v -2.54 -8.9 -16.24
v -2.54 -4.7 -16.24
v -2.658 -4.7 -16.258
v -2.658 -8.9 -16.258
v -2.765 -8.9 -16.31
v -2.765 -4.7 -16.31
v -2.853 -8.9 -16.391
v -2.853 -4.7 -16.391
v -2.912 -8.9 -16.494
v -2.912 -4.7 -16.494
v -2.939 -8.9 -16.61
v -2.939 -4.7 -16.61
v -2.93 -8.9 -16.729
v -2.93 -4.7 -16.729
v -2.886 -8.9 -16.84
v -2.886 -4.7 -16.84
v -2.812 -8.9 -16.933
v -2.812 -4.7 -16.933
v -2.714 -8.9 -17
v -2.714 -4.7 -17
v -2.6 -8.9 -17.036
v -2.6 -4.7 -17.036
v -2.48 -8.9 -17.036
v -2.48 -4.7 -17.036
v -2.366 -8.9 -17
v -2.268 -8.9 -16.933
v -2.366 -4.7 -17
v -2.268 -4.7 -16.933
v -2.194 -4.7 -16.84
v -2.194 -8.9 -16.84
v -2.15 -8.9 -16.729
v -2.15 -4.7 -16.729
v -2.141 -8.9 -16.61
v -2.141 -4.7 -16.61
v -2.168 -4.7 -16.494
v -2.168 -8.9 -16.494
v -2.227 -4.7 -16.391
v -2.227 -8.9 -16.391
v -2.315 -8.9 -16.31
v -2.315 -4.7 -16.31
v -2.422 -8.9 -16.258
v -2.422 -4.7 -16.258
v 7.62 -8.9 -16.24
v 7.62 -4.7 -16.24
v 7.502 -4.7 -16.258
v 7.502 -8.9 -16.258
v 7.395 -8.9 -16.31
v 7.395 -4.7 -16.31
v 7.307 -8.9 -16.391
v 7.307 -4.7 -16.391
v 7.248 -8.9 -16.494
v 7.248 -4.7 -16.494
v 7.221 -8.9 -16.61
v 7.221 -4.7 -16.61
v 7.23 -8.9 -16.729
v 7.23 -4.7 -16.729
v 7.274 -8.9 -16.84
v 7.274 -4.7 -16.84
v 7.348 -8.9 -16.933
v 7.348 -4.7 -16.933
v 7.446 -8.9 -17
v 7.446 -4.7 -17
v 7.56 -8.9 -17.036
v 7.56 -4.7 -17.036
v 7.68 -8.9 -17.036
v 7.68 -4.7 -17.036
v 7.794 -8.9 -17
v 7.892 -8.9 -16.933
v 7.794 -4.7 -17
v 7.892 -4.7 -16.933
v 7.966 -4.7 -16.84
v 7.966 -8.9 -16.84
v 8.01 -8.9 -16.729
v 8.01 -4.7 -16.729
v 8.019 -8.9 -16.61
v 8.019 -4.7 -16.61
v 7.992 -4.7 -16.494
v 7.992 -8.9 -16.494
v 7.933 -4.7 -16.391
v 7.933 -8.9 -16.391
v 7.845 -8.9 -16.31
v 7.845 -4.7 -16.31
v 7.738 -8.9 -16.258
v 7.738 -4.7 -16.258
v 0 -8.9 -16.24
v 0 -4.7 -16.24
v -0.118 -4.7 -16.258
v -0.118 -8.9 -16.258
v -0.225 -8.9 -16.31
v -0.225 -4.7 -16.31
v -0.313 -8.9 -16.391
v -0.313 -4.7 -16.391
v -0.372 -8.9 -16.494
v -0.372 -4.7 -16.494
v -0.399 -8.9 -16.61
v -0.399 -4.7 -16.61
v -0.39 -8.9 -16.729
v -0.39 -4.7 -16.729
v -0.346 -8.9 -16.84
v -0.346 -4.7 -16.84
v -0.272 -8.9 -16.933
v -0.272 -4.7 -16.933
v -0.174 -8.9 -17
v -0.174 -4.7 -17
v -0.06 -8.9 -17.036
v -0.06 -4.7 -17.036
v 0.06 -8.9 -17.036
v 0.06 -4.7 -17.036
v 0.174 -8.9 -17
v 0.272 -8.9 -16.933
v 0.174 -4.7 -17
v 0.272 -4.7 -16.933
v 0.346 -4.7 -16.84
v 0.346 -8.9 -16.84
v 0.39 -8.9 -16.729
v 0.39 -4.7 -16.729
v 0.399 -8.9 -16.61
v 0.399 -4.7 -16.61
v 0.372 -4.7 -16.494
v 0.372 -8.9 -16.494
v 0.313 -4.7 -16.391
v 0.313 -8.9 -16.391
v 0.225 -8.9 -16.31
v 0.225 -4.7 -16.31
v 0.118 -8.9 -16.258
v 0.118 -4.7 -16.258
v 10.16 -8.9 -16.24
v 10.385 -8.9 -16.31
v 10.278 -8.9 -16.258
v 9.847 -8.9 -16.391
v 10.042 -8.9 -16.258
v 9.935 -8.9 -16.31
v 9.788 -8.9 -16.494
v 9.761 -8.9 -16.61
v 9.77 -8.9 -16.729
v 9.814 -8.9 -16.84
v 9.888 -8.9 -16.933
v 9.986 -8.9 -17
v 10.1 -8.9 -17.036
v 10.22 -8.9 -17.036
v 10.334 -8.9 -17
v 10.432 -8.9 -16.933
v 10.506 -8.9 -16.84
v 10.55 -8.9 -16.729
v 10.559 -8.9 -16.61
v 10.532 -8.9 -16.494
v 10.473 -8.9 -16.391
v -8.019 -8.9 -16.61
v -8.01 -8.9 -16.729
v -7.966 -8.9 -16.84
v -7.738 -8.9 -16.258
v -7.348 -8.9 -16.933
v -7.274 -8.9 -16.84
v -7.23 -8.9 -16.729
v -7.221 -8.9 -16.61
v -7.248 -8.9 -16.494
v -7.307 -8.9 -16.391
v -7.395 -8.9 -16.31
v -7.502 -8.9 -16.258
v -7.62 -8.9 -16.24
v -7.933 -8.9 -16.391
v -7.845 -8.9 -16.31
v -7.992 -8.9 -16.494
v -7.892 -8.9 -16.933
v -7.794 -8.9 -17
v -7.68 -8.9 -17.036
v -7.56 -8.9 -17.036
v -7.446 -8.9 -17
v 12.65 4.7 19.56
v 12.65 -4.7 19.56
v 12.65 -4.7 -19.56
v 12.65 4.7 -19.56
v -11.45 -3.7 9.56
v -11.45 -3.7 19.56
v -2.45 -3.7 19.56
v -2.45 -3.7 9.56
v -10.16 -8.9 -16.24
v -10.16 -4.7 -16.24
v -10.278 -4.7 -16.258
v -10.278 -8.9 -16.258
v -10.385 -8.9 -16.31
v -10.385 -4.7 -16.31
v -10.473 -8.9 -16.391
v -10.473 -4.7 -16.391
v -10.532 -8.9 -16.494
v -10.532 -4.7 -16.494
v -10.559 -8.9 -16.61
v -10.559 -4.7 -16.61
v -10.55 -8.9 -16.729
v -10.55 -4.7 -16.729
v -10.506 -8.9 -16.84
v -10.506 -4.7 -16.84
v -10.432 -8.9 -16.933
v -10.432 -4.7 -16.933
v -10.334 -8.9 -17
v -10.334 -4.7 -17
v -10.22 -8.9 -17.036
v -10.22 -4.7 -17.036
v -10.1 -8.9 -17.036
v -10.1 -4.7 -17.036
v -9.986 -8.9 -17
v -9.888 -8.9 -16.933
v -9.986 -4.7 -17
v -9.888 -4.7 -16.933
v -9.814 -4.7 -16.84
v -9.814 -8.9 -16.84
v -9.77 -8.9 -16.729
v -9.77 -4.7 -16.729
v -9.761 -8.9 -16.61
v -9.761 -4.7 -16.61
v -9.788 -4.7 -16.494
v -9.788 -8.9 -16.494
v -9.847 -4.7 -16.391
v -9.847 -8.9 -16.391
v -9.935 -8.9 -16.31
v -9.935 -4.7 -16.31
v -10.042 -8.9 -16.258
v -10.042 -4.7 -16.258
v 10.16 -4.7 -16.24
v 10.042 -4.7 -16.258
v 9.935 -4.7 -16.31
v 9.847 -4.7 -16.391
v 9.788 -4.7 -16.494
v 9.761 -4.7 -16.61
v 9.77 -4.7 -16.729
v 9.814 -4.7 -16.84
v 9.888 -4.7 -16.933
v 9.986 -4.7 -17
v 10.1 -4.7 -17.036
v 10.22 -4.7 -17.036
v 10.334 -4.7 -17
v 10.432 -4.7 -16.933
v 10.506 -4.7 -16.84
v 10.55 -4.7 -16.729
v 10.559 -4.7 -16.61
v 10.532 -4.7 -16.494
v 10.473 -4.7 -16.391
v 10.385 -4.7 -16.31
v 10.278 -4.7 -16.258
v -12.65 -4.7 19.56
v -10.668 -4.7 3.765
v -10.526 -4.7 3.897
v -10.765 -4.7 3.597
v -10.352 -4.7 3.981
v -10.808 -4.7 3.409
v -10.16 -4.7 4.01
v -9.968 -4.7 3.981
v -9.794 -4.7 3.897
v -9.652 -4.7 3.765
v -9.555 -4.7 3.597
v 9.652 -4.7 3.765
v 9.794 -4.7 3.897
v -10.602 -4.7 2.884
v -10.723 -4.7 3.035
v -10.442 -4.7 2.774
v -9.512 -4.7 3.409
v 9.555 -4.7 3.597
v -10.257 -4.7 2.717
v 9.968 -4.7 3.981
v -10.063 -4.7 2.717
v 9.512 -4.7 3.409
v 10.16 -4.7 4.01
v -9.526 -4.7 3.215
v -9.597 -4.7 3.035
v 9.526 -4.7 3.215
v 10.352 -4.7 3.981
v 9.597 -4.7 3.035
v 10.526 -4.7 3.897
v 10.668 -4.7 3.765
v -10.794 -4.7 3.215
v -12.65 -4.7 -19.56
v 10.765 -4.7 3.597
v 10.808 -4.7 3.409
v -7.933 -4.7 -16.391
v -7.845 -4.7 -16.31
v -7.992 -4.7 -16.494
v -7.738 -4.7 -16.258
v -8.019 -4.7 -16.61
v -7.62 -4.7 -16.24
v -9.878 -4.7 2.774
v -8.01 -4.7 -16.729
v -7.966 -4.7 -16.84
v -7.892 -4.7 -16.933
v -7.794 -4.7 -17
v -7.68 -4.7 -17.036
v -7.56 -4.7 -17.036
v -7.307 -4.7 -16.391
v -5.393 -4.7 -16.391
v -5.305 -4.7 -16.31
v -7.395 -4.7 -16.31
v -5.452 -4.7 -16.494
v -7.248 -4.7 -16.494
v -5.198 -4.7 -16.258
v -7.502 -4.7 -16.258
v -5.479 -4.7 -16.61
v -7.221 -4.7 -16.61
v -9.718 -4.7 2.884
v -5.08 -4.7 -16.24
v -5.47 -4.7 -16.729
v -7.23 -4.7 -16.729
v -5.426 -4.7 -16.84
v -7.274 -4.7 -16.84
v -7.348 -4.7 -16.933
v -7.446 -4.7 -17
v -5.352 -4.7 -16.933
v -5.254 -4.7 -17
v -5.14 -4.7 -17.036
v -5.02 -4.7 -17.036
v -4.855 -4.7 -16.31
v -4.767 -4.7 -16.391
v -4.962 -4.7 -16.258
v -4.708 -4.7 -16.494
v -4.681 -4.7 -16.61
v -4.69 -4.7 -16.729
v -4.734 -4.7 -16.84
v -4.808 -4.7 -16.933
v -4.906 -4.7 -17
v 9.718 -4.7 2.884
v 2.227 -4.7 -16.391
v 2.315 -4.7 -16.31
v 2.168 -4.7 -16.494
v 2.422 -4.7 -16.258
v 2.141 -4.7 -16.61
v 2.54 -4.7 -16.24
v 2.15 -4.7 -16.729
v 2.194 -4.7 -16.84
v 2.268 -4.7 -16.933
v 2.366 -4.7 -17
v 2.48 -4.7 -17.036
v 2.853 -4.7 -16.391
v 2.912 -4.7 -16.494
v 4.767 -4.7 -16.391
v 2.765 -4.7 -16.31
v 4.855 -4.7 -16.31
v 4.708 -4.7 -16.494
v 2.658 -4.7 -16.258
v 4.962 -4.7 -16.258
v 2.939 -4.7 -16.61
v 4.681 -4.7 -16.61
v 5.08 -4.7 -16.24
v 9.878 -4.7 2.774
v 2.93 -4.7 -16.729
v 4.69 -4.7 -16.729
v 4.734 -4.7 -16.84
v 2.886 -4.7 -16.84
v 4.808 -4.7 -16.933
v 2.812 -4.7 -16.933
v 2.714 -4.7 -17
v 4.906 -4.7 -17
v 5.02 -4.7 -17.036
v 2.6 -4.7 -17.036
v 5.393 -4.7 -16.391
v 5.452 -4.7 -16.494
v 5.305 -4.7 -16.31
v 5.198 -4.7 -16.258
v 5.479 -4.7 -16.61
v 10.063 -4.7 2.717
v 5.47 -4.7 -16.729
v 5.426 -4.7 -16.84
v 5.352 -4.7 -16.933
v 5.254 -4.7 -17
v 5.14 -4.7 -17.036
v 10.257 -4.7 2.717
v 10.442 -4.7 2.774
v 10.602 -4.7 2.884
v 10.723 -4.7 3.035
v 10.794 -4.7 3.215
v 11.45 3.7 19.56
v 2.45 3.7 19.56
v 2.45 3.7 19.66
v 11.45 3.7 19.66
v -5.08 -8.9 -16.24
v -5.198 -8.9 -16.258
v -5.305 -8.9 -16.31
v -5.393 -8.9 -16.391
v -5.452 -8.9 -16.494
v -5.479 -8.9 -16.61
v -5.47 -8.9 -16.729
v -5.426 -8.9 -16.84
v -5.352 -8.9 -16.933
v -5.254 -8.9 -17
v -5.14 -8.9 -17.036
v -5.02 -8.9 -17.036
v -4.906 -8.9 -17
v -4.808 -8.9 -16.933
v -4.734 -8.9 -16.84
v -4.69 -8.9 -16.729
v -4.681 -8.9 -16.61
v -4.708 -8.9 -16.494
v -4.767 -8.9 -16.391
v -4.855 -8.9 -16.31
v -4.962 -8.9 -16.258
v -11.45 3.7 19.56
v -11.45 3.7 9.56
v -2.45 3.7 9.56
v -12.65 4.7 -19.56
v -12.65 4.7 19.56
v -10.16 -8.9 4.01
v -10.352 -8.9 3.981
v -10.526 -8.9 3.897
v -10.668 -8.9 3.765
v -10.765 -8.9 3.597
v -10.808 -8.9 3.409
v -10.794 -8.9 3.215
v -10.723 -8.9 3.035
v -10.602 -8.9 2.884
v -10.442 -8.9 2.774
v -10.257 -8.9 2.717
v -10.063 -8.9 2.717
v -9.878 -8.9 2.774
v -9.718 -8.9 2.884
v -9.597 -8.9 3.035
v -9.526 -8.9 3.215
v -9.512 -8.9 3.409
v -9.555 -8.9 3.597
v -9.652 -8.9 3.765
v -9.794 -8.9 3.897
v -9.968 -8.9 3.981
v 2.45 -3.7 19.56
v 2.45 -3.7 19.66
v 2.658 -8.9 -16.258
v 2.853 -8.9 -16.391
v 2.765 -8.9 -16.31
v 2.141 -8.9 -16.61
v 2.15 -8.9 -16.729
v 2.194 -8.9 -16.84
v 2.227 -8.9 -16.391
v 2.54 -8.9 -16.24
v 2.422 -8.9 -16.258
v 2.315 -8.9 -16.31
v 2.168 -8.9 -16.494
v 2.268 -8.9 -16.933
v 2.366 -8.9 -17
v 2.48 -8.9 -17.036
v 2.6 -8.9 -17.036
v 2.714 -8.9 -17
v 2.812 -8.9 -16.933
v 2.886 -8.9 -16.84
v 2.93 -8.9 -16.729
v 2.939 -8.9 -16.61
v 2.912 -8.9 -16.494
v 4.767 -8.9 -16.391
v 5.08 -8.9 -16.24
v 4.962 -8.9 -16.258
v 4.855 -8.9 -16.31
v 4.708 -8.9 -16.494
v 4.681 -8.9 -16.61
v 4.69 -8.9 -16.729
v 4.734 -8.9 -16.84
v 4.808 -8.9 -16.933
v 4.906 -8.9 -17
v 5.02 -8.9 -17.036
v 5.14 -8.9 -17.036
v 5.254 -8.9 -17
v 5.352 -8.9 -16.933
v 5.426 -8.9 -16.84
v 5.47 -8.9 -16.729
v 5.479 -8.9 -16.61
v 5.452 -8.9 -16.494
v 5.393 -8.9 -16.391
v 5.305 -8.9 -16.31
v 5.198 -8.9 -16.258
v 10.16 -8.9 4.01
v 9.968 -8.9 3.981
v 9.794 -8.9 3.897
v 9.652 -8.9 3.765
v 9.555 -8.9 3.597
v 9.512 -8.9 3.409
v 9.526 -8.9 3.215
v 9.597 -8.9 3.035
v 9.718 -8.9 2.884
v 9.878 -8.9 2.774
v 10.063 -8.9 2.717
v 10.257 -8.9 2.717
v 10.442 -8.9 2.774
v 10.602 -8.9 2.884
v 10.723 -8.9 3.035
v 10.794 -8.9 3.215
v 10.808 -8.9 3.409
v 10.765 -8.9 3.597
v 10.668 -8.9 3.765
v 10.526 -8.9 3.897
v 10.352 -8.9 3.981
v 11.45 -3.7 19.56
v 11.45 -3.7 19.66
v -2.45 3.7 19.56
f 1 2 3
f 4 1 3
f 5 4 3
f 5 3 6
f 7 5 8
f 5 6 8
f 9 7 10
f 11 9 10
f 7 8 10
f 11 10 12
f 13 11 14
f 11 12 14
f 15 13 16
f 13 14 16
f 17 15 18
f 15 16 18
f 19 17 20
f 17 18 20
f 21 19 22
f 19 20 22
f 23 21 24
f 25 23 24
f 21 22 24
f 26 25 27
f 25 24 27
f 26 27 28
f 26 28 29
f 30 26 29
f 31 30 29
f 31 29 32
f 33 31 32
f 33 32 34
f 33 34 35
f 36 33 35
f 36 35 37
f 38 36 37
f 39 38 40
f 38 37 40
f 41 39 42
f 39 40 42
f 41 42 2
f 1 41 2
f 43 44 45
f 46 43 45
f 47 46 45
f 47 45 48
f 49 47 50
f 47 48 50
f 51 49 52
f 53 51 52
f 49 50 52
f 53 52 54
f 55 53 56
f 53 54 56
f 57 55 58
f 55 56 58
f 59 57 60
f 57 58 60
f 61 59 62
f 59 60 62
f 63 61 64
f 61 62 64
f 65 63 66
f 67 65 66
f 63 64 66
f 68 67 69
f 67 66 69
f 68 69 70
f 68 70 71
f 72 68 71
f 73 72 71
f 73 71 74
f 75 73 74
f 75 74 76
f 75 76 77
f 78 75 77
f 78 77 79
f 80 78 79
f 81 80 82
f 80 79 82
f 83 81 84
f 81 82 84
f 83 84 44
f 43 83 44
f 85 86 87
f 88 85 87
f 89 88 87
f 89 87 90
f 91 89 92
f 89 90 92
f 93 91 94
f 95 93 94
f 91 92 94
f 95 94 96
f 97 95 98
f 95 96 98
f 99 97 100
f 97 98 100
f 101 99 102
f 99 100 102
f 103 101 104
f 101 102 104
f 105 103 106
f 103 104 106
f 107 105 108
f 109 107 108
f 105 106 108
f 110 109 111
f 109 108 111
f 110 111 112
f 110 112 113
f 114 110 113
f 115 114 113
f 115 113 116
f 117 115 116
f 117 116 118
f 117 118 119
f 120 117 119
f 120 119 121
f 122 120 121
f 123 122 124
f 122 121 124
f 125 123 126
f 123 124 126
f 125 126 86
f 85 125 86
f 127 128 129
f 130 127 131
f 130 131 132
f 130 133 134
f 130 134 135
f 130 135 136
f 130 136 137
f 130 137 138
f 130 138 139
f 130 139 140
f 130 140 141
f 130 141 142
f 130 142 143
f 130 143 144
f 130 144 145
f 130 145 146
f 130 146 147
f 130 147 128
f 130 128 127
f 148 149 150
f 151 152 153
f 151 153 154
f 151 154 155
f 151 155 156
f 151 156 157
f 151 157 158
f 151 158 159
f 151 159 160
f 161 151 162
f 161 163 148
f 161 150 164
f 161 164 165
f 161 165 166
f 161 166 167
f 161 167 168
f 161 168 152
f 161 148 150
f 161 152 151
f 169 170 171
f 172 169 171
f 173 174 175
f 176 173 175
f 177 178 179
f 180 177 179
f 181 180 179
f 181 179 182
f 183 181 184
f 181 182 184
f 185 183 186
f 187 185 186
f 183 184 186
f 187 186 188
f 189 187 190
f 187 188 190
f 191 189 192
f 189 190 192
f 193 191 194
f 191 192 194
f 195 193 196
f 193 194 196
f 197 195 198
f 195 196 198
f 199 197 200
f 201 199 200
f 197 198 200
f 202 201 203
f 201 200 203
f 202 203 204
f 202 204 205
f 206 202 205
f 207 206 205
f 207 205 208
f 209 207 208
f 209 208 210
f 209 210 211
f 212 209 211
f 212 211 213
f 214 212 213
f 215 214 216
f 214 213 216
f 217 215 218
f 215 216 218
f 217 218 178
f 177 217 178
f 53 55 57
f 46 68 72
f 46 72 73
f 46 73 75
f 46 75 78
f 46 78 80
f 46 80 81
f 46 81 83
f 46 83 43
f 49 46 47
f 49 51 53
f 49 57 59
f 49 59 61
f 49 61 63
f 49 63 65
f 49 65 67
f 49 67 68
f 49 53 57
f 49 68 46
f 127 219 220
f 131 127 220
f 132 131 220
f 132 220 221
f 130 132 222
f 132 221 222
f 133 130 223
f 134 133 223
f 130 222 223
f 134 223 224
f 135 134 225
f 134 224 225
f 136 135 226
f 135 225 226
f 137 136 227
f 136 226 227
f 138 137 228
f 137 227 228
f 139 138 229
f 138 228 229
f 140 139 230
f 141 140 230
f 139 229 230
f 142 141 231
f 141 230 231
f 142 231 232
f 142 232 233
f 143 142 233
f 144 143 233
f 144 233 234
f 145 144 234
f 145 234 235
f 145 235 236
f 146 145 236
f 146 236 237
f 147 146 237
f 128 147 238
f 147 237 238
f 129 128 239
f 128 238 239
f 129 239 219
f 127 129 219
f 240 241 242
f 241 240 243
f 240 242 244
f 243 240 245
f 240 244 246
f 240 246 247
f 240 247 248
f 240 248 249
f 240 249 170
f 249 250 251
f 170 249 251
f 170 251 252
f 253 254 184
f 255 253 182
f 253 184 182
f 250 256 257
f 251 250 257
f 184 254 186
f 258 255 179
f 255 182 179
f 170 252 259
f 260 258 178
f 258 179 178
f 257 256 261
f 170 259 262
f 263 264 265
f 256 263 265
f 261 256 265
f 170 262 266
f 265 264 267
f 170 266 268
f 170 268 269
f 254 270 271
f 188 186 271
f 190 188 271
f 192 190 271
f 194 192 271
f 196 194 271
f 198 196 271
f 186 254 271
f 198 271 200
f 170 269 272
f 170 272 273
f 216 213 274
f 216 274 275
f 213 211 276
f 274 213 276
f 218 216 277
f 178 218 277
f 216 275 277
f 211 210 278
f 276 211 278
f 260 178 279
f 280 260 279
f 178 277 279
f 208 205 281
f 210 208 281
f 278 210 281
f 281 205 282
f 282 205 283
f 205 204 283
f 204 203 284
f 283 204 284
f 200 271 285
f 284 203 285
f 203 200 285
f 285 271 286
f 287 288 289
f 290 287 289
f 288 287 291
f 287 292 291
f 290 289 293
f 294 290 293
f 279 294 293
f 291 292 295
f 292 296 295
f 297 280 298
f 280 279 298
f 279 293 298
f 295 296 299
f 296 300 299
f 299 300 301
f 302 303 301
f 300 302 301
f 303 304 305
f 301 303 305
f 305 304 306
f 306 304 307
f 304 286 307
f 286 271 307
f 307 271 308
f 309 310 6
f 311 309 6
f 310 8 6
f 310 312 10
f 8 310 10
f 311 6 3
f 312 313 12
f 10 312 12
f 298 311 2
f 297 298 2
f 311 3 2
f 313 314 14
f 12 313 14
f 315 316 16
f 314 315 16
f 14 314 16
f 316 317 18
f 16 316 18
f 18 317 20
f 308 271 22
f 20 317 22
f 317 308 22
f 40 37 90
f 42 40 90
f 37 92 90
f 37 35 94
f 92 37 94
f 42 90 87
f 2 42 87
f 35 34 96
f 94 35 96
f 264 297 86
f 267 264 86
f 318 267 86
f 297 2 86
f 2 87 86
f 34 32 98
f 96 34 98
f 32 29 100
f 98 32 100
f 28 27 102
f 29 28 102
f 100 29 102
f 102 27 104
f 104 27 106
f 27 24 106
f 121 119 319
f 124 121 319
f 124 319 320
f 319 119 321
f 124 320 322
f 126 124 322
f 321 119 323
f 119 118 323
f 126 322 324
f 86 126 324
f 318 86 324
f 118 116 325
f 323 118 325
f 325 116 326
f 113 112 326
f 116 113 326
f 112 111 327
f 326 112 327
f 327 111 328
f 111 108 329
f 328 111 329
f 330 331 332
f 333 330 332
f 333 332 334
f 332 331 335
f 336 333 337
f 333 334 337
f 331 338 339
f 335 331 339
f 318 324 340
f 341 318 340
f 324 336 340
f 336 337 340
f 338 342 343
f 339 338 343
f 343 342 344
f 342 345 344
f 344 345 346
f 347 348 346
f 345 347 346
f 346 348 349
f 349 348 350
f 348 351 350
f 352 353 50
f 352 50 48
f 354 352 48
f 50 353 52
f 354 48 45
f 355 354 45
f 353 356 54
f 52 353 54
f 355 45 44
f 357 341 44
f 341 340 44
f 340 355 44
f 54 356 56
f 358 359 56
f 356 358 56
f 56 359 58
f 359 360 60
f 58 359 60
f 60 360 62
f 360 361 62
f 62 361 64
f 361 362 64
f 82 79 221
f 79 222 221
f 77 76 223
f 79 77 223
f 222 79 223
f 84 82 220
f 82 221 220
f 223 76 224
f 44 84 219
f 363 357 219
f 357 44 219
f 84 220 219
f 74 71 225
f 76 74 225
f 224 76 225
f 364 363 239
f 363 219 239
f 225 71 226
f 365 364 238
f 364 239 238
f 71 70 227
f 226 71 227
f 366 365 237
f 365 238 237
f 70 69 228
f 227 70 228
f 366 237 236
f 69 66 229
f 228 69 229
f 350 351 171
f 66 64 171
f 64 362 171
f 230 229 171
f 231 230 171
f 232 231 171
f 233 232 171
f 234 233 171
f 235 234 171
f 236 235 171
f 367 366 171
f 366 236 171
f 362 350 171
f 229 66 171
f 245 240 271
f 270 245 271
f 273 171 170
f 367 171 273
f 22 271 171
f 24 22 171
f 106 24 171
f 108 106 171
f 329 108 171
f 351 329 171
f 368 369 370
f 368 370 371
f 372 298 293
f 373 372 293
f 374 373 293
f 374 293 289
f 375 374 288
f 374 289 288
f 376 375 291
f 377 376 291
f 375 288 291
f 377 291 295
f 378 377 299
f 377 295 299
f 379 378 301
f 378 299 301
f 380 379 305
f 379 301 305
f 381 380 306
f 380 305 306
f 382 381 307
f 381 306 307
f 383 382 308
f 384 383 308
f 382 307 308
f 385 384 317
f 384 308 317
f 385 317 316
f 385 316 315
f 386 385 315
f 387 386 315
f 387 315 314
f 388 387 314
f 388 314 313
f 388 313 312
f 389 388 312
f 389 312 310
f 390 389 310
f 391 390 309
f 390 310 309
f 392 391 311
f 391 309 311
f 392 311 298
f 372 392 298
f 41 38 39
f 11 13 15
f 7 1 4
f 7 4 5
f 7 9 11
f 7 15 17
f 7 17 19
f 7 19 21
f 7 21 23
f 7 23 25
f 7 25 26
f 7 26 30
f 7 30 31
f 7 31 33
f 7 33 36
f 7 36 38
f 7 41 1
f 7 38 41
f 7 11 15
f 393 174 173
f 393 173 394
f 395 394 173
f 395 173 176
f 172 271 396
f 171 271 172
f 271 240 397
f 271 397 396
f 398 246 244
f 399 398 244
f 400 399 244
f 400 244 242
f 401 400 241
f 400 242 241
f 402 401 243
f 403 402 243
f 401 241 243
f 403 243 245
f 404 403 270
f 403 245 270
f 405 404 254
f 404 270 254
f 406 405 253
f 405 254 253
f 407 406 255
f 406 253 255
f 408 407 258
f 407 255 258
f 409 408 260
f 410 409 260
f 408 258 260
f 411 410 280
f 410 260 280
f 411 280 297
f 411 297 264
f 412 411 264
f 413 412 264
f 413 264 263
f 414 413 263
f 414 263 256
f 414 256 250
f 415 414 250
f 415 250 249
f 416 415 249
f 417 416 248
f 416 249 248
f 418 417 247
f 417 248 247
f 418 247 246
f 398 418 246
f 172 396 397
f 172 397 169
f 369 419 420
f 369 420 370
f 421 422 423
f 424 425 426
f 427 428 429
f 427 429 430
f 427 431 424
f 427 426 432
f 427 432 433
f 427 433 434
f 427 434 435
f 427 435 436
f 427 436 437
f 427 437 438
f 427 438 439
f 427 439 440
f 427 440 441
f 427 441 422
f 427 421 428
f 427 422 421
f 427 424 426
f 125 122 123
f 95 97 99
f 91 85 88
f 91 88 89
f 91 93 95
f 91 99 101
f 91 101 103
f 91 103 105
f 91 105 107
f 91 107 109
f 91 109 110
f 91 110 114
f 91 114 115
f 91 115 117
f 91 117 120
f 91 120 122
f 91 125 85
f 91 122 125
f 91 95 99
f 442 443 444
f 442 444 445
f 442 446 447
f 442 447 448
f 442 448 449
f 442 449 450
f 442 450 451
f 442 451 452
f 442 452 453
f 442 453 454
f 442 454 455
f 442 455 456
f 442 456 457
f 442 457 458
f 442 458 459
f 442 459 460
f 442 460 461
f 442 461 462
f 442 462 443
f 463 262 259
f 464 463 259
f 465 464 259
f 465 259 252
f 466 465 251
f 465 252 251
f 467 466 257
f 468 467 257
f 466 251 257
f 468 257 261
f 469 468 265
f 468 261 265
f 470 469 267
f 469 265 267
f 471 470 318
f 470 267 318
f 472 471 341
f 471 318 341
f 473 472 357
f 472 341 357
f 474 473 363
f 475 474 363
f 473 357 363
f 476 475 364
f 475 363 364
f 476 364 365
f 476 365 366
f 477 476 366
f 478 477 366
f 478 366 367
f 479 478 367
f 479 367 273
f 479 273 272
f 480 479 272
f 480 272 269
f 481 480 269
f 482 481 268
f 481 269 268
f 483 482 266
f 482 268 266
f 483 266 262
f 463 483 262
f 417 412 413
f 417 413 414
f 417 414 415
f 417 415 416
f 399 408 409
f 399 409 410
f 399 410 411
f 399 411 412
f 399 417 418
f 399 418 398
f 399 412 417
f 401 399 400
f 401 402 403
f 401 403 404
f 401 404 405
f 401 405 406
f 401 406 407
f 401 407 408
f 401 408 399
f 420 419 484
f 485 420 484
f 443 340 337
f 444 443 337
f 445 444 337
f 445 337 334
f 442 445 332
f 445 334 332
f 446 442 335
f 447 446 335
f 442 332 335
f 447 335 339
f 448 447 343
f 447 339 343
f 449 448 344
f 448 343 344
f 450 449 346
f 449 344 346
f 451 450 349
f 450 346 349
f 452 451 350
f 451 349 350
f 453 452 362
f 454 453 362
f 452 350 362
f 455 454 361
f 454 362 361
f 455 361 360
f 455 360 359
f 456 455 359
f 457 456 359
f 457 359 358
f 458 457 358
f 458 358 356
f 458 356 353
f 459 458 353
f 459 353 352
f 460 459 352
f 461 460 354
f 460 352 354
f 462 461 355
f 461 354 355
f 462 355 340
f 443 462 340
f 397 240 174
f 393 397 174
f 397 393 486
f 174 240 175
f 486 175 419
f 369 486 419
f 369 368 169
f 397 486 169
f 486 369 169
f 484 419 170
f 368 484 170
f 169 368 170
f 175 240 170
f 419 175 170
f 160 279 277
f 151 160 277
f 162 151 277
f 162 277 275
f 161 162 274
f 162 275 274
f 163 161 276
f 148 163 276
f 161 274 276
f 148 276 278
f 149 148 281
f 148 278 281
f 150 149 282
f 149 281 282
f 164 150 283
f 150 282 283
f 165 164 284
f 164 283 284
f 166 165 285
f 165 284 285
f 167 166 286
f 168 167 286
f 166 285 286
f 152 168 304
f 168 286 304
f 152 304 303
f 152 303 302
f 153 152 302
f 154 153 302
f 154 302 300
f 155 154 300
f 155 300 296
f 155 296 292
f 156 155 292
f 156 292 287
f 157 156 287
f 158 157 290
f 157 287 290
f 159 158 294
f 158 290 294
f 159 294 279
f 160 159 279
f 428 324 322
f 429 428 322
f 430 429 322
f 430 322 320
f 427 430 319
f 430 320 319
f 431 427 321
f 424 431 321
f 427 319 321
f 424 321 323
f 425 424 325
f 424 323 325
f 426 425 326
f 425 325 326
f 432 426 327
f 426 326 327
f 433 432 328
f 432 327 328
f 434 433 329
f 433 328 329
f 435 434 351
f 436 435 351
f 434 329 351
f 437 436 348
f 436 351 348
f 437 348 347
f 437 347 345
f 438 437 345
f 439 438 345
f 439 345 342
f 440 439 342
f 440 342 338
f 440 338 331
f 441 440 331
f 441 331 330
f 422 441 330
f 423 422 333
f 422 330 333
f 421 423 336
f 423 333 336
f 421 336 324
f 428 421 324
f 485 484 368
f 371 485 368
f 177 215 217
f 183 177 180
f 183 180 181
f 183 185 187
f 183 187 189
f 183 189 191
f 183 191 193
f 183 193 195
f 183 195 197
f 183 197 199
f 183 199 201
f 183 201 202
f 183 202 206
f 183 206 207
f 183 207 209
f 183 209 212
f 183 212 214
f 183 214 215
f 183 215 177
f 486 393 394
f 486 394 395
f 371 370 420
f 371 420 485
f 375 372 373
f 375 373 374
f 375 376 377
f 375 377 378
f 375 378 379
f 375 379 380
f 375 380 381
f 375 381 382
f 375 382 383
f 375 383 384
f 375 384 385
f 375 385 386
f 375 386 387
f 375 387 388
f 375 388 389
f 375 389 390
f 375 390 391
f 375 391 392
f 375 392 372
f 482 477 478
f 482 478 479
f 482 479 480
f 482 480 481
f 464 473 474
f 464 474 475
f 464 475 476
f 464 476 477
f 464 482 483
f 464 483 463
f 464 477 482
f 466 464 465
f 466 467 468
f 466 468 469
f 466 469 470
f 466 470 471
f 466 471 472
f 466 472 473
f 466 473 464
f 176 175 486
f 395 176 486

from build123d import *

# Parameters (mm, degrees)
EXTRUDE_1_DEPTH      = 4.7
EXTRUDE_1_DEPTH_BACK = 4.7
SKETCH_1_W           = 25.3
SKETCH_1_H           = 39.12
SKETCH_2_W           = 9
SKETCH_2_H           = 7.4
CUT_EXTRUDE_2_DEPTH  = 10
SKETCH_3_W           = 9
SKETCH_3_H           = 7.4
EXTRUDE_4_DEPTH      = 0.1
SKETCH_4_R           = 0.65
SKETCH_4_R_2         = 0.4
EXTRUDE_3_DEPTH      = 4.2


with BuildPart() as part:
    # 草图1 → 凸台-拉伸1 (new, two sides: drawn at the far end of the back side and taken through both)
    with BuildSketch(Plane(origin=(0, 0, 0), x_dir=(1, 0, 0), z_dir=(0, 1, 0)).offset(-EXTRUDE_1_DEPTH_BACK)):
        Rectangle(SKETCH_1_W, SKETCH_1_H)
    extrude(amount=EXTRUDE_1_DEPTH + EXTRUDE_1_DEPTH_BACK)

    # 草图2 → 切除-拉伸2 (cut)
    with BuildSketch(Plane.XY.offset(19.56)):
        with Locations((-6.95, 0)):
            Rectangle(SKETCH_2_W, SKETCH_2_H)
    extrude(amount=-CUT_EXTRUDE_2_DEPTH, mode=Mode.SUBTRACT)

    # 草图3 → 凸台-拉伸4 (add)
    with BuildSketch(Plane.XY.offset(19.56)):
        with Locations((6.95, 0)):
            Rectangle(SKETCH_3_W, SKETCH_3_H)
    extrude(amount=EXTRUDE_4_DEPTH)

    # 草图4 → 凸台-拉伸3 (add)
    with BuildSketch(Plane.XZ.offset(4.7)):
        with Locations((-10.16, 3.36)):
            Circle(SKETCH_4_R)
        with Locations((10.16, 3.36)):
            Circle(SKETCH_4_R)
        with Locations((-10.16, -16.64)):
            Circle(SKETCH_4_R_2)
        with Locations((-7.62, -16.64)):
            Circle(SKETCH_4_R_2)
        with Locations((-5.08, -16.64)):
            Circle(SKETCH_4_R_2)
        with Locations((-2.54, -16.64)):
            Circle(SKETCH_4_R_2)
        with Locations((0, -16.64)):
            Circle(SKETCH_4_R_2)
        with Locations((2.54, -16.64)):
            Circle(SKETCH_4_R_2)
        with Locations((5.08, -16.64)):
            Circle(SKETCH_4_R_2)
        with Locations((7.62, -16.64)):
            Circle(SKETCH_4_R_2)
        with Locations((10.16, -16.64)):
            Circle(SKETCH_4_R_2)
    extrude(amount=EXTRUDE_3_DEPTH)


solid = part.part
